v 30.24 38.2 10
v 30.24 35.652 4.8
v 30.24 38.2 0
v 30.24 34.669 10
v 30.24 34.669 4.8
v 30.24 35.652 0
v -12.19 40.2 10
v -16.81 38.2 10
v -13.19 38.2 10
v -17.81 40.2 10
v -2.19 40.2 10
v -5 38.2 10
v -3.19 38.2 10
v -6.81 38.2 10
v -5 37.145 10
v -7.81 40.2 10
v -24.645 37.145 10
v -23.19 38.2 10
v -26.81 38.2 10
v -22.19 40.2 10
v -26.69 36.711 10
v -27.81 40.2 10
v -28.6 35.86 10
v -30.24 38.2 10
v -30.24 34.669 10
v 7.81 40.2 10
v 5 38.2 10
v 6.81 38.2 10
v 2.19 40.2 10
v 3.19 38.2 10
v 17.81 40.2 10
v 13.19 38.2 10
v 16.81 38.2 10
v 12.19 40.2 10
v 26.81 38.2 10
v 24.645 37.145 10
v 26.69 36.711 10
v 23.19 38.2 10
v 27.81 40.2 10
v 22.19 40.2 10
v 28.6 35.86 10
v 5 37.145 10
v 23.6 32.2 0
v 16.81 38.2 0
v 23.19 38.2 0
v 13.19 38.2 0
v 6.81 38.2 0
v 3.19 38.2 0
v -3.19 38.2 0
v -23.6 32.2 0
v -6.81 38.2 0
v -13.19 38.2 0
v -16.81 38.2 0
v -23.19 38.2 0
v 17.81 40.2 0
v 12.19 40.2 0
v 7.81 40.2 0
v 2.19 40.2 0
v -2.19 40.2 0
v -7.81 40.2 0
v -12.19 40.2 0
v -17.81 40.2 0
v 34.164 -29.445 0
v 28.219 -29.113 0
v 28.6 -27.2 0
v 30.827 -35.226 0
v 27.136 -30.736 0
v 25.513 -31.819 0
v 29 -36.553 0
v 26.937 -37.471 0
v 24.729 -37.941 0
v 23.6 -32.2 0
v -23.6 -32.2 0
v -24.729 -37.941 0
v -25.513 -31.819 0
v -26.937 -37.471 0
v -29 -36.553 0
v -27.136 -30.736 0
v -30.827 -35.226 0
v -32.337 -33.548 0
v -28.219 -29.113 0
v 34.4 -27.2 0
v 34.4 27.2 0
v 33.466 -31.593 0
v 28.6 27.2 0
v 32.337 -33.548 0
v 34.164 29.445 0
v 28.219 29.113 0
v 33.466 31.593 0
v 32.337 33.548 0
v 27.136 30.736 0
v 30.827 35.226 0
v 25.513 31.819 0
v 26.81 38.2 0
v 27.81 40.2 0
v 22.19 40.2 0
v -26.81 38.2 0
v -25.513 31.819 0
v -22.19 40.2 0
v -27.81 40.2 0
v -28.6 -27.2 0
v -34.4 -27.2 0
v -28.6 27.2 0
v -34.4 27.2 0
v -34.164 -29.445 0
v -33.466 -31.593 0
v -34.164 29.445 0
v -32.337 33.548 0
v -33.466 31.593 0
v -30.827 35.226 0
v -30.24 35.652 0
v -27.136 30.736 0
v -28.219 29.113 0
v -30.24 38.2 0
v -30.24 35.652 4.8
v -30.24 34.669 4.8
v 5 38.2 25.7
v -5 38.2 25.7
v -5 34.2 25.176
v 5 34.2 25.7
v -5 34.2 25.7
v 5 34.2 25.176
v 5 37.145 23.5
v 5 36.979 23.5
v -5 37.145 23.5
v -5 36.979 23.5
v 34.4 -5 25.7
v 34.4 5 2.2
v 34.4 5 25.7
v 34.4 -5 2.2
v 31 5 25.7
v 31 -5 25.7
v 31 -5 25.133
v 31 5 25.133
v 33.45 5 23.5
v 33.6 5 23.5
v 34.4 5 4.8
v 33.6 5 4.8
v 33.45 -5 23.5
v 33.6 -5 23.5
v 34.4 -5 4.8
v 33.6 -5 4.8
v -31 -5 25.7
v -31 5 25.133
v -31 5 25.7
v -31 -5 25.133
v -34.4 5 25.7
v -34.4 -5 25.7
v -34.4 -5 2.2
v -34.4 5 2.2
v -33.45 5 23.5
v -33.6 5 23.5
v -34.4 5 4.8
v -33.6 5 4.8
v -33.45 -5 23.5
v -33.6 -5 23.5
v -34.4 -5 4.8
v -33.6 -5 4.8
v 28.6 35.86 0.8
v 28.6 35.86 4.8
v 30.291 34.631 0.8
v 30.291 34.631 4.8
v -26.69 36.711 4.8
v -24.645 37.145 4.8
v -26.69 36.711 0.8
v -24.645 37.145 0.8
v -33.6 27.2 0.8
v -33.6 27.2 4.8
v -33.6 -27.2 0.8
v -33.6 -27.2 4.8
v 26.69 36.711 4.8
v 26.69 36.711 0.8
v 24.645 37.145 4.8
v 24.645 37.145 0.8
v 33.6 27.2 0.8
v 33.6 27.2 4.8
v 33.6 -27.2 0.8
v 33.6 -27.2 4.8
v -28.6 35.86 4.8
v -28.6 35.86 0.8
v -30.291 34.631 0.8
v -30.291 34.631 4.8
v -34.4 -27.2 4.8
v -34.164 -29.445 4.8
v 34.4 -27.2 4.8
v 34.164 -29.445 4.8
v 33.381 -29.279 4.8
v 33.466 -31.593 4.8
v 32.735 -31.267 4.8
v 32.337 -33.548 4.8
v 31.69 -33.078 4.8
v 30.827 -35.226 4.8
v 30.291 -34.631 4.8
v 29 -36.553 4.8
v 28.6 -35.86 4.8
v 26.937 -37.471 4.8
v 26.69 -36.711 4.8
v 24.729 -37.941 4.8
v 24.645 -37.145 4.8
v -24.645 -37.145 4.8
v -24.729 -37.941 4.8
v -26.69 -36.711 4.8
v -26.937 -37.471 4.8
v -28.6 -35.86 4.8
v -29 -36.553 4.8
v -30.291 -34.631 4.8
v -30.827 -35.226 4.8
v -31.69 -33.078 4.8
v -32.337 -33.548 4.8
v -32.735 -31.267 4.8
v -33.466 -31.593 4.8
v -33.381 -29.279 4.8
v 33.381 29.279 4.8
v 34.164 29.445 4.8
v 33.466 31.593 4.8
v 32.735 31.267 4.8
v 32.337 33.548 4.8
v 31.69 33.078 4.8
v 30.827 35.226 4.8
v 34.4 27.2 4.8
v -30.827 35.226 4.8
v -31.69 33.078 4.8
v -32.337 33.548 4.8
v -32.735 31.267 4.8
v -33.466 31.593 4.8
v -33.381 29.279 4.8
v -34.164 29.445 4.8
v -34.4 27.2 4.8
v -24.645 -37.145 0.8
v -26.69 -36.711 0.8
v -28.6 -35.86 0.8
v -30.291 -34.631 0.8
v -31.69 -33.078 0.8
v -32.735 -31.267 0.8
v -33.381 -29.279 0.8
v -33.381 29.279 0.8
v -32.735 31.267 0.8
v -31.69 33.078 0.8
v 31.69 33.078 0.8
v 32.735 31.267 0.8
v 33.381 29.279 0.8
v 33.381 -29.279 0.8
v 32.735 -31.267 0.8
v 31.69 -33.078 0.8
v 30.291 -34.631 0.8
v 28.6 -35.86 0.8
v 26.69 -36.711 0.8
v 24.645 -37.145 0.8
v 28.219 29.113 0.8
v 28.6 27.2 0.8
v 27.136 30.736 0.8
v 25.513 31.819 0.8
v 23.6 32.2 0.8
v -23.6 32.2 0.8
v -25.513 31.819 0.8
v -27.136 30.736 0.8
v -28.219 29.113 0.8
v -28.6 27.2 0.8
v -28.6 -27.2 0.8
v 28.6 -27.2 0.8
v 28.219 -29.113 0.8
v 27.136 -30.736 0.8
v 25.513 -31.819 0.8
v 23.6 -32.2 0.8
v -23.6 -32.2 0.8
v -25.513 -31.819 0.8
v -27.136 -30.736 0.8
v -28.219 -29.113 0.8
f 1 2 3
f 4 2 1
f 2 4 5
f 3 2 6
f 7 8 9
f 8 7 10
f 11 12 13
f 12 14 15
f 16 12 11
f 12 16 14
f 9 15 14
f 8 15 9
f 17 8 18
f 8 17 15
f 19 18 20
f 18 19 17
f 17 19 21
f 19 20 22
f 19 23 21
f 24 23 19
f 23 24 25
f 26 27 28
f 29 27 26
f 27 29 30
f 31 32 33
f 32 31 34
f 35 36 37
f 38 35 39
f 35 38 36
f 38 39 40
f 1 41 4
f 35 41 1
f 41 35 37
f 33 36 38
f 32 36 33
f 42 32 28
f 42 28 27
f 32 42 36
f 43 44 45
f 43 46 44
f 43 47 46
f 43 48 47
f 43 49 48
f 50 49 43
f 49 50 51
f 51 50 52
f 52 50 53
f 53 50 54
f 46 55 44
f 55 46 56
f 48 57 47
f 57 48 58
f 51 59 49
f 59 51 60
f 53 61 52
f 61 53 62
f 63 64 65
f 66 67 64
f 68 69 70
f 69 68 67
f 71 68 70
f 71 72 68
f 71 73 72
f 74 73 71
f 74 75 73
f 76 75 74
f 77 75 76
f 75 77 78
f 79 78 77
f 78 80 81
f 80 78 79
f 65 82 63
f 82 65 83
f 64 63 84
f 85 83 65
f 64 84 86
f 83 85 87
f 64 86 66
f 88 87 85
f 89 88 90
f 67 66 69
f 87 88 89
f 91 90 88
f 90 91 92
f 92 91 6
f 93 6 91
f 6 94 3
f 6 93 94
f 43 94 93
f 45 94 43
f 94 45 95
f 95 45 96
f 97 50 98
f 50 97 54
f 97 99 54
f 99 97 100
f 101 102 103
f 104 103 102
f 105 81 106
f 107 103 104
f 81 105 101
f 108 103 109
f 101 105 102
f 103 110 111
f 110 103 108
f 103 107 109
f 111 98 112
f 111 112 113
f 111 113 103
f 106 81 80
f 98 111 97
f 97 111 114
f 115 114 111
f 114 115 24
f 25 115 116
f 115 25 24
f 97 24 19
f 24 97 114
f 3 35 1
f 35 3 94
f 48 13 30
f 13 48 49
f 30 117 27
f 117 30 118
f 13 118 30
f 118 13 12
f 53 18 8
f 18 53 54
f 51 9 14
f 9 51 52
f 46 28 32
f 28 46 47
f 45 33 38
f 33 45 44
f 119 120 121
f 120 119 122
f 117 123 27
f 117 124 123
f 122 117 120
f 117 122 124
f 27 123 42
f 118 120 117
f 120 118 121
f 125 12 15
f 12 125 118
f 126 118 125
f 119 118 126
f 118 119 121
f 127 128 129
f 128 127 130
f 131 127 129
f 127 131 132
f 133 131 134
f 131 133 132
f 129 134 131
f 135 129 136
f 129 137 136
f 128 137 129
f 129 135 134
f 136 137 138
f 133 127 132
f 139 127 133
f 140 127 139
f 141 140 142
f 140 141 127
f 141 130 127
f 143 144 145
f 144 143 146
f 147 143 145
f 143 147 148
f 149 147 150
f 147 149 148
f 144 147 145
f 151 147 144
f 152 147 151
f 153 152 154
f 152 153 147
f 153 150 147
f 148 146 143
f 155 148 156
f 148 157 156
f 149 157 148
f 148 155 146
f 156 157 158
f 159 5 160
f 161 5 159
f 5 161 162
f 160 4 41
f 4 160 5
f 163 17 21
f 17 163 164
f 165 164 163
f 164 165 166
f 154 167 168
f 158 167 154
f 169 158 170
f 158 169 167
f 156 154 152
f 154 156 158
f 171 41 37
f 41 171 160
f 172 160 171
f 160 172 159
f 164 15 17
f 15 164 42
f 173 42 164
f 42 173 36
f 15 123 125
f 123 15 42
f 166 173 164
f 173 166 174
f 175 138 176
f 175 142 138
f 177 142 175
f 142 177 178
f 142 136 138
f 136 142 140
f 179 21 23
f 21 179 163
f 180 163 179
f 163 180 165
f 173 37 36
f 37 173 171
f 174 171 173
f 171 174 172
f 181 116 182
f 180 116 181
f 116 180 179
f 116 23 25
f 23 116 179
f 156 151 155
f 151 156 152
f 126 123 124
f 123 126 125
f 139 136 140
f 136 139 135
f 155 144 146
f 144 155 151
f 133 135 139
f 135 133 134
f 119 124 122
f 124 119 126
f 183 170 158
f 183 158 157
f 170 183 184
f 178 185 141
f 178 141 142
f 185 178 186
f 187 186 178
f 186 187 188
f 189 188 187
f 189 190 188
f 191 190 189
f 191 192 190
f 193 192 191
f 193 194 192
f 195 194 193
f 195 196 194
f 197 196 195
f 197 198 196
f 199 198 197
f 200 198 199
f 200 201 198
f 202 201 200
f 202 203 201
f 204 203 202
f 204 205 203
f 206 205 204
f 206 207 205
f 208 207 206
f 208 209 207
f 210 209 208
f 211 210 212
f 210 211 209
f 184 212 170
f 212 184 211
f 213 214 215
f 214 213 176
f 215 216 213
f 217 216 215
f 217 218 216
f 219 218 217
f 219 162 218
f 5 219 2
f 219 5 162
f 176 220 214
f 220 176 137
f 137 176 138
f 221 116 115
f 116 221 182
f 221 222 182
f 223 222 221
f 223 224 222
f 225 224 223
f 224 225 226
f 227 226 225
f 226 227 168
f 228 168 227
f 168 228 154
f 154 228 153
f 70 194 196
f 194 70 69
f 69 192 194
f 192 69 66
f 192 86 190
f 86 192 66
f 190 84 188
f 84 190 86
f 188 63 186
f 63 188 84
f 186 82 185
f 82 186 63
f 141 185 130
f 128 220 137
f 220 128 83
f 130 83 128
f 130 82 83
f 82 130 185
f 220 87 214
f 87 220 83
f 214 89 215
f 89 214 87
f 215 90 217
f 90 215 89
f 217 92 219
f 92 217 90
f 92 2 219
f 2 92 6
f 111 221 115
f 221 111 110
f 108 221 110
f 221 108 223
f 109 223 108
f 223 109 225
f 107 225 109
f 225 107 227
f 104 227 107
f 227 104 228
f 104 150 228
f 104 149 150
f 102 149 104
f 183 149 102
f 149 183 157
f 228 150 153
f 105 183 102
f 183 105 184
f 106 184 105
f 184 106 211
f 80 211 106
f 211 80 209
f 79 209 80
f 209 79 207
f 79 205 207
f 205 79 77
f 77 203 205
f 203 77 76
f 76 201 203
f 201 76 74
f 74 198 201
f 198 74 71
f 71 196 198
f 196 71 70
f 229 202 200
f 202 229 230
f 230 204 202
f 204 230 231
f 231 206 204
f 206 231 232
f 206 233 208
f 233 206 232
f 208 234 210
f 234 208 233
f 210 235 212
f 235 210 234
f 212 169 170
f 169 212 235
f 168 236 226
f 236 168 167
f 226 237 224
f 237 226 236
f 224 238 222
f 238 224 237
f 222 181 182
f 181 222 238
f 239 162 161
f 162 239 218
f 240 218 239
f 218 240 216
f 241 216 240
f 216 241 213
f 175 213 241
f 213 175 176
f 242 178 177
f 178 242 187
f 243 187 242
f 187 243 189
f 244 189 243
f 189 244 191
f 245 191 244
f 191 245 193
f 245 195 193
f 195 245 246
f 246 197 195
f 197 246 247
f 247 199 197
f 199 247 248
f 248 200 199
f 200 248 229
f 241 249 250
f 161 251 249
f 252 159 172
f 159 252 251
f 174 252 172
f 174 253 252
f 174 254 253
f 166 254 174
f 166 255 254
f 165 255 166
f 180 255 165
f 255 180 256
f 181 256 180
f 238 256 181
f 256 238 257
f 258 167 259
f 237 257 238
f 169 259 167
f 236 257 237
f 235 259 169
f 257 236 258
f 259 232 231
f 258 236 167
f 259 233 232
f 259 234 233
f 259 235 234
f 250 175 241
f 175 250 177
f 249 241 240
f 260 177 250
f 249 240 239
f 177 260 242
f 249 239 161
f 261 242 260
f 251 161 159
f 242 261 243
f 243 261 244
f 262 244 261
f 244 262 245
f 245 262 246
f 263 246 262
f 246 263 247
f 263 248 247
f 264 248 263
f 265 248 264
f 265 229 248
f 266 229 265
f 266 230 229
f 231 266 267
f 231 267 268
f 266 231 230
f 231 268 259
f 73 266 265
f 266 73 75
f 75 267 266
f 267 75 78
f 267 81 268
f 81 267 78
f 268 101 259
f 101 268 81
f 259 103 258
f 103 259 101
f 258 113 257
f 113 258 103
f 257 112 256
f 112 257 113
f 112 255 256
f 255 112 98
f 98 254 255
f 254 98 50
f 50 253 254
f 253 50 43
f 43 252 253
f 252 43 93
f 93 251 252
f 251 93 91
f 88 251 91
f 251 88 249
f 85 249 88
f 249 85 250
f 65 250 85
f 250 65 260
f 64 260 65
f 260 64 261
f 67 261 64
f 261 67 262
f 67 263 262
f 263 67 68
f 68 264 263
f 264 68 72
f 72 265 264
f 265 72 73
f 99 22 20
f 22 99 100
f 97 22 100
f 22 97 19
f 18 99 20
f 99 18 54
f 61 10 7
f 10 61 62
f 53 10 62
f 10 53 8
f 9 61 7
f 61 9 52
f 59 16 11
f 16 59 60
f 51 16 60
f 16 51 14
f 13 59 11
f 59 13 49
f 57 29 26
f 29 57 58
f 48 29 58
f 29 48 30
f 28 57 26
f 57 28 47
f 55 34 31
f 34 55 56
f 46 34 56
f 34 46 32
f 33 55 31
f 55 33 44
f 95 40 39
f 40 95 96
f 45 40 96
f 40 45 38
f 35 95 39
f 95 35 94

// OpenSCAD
// Fixture for TP-Link MR3020 WLAN Router 
// 
// 
// Background:
//   - Optional mounting on a 35mm DIN-Rail (Hutschiene) 
//     using dovetail connection
//   - repository: https://github.com/Github6am/am_parts3D
//   - CAD manual: http://www.openscad.org/documentation.html
//
//
// Andreas Merz 2019-08-20, v0.3 
// GPLv3 or later, see http://www.gnu.org/licenses


// import dovetail and mounting plate definitions
use <raspi_RJ45fix.scad>

// Main dimensions
xin=67.2;      // width
yin=74.4;      // length
zin=22.7;      // height
wall=0.8;      // wall thickness

//-------------------------------------------
// enclosure for TP-Link MR3020 Router case
//-------------------------------------------
module MR3020shape(w=0) {
    rc=10;     // corner radius
    minkowski() { 
        circle(r=rc+w);
        square([xin-2*rc,yin-2*rc], center=true);
        }
}


module MR3020fixture() {
   h1=4+wall;
   
   union() {
     linear_extrude(height = h1)
       difference() {
         MR3020shape(w=wall);
         MR3020shape(w=0);
       }
     linear_extrude(height = wall)
       difference() {
         MR3020shape(w=wall);
         MR3020shape(w=-5);
       }
     difference() {
         union(){    // Halteclips
           translate([0, yin/2-1, 5])              cube([xin*0.9, 4, 10], center=true);
           translate([0, yin/2-1, (zin+wall+2)/2+1.2]) cube([10, 4, zin+wall], center=true);
           translate([  xin/2+wall-3.4/2,  0, (zin+wall+2)/2+1.2]) cube([3.4, 10, zin+wall], center=true);
           translate([-(xin/2+wall-3.4/2), 0, (zin+wall+2)/2+1.2]) cube([3.4, 10, zin+wall], center=true);
         }
         union() {   // TP-Link Gehaeuse mit Dachschraege
           linear_extrude(height = zin+wall) MR3020shape(w=0);
           translate([0,0,zin+wall-0.1]) linear_extrude(height = xin/3,scale=0) MR3020shape(w=0);
         }
     }
     // right interface
     linear_extrude(height = 10) 
       union() {
         translate([-3*10+5,yin/2+1,0]) rotate(0) schwalbenschwanz();
         translate([-2*10+5,yin/2+1,0]) rotate(0) schwalbenschwanz();
         translate([-1*10+5,yin/2+1,0]) rotate(0) schwalbenschwanz();
         translate([ 0*10+5,yin/2+1,0]) rotate(0) schwalbenschwanz();
         translate([ 1*10+5,yin/2+1,0]) rotate(0) schwalbenschwanz();
         translate([ 2*10+5,yin/2+1,0]) rotate(0) schwalbenschwanz();
       }
   } 
}

//------------- Instances --------------------

MR3020fixture();
